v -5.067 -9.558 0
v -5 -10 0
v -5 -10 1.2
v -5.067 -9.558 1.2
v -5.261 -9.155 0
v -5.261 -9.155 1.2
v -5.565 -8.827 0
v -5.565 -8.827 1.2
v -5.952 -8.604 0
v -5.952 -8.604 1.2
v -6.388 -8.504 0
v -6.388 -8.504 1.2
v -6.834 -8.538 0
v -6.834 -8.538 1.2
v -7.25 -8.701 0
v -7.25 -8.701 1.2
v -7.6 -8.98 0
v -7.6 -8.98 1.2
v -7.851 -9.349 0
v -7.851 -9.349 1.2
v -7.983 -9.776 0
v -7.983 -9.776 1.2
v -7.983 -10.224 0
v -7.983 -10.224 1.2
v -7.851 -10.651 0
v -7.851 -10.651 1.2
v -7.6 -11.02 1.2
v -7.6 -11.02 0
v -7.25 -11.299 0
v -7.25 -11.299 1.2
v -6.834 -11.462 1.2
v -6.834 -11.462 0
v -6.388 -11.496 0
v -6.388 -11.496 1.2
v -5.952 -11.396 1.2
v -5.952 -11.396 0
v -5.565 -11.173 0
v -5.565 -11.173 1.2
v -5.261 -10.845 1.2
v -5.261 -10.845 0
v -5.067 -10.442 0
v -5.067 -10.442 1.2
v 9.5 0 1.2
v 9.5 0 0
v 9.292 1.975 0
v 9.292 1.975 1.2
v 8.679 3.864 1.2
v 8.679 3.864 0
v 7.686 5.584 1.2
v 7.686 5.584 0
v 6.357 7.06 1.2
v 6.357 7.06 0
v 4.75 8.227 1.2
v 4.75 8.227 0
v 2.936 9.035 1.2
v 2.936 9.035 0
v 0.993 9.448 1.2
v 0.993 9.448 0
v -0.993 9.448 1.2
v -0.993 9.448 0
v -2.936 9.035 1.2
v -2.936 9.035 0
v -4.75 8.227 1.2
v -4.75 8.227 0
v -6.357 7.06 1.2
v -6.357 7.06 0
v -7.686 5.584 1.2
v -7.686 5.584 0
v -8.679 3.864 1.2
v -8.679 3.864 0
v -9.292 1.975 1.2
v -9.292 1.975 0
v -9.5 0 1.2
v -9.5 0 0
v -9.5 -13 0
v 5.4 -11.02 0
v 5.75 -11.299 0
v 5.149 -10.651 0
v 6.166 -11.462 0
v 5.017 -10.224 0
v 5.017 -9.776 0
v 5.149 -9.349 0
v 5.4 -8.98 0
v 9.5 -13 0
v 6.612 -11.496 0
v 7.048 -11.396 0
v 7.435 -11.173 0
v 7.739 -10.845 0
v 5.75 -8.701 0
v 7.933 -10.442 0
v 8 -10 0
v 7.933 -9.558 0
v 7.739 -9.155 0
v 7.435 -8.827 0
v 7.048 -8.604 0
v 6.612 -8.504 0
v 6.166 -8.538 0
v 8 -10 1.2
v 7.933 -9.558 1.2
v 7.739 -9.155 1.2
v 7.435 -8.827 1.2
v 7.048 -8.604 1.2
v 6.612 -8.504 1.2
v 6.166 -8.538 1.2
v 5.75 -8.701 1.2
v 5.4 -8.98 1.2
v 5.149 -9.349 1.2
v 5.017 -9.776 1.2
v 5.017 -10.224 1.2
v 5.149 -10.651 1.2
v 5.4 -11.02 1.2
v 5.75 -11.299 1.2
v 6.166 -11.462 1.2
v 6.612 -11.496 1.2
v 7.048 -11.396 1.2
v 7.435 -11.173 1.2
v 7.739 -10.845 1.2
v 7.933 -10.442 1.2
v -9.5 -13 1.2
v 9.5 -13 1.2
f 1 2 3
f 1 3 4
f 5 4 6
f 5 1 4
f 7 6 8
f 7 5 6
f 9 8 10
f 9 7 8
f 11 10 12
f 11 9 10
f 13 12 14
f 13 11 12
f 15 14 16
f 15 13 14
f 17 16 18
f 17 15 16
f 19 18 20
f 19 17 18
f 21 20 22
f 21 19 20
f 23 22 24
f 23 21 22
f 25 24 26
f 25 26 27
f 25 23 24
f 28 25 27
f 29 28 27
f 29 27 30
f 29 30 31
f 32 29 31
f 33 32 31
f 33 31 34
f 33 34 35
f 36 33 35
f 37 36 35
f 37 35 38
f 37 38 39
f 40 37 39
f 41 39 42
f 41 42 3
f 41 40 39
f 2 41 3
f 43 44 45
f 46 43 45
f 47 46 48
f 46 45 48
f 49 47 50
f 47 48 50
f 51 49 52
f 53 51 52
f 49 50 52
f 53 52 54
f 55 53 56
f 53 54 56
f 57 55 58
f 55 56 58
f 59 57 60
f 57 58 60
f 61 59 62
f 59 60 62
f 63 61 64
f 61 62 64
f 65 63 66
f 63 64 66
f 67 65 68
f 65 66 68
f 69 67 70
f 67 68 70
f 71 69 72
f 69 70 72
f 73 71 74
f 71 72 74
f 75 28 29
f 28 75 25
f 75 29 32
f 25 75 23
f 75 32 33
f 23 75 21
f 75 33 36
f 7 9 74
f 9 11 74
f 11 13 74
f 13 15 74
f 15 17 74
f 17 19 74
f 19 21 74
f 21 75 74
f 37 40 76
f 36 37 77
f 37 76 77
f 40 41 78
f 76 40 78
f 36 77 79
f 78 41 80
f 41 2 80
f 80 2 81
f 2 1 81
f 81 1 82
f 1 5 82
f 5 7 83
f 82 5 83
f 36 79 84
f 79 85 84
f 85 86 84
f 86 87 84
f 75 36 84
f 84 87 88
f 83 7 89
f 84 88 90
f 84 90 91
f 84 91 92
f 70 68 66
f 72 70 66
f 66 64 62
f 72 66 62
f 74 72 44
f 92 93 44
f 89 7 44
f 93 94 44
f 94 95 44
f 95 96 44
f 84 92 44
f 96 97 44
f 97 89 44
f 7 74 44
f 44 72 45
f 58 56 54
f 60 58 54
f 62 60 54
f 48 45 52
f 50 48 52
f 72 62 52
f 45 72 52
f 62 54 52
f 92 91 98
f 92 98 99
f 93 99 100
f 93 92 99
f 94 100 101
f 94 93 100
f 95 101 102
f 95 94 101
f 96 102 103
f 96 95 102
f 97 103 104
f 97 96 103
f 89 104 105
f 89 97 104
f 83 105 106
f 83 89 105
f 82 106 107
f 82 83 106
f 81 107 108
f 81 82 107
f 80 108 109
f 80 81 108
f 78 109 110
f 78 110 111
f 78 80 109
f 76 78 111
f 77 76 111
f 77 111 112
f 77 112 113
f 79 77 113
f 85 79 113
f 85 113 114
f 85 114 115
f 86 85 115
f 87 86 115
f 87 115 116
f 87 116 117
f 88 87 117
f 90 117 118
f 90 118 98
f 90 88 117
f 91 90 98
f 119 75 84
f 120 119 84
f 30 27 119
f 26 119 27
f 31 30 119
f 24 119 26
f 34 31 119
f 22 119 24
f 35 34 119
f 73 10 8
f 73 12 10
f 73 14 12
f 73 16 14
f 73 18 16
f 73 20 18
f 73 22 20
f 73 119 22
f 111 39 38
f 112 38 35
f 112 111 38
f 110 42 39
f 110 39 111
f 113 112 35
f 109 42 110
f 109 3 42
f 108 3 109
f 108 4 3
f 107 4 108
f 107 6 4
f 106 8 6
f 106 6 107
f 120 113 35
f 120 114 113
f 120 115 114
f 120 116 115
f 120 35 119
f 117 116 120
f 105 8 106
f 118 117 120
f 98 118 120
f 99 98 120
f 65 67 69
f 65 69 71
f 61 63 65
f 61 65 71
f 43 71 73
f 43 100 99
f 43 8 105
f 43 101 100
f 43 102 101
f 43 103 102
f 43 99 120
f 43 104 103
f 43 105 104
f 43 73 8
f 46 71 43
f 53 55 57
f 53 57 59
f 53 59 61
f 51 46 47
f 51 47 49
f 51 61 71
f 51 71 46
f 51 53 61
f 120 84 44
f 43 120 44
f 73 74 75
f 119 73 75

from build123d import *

# Parameters (mm, degrees)
F0_R     = 1.5
F1_DEPTH = 1.2


with BuildPart() as f1:
    # F0 (on Top) → F1 (new body)
    with BuildSketch(Plane.XY):
        with BuildLine():
            Line((-9.5, 0), (9.5, 0))
            ThreePointArc((9.5, 0), (0, 9.5), (-9.5, 0))
        make_face()
        with BuildLine():
            ThreePointArc((-9.5, 0), (0, -9.5), (9.5, 0))
            Line((9.5, 0), (-9.5, 0))
        make_face()
        with BuildLine():
            Line((9.5, -13), (9.5, 0))
            ThreePointArc((9.5, 0), (0, -9.5), (-9.5, 0))
            Line((-9.5, 0), (-9.5, -13))
            Line((-9.5, -13), (9.5, -13))
        make_face()
        with Locations((-6.5, -10)):
            Circle(F0_R, mode=Mode.SUBTRACT)
        with Locations((6.5, -10)):
            Circle(F0_R, mode=Mode.SUBTRACT)
    extrude(amount=F1_DEPTH)


solid = f1.part
